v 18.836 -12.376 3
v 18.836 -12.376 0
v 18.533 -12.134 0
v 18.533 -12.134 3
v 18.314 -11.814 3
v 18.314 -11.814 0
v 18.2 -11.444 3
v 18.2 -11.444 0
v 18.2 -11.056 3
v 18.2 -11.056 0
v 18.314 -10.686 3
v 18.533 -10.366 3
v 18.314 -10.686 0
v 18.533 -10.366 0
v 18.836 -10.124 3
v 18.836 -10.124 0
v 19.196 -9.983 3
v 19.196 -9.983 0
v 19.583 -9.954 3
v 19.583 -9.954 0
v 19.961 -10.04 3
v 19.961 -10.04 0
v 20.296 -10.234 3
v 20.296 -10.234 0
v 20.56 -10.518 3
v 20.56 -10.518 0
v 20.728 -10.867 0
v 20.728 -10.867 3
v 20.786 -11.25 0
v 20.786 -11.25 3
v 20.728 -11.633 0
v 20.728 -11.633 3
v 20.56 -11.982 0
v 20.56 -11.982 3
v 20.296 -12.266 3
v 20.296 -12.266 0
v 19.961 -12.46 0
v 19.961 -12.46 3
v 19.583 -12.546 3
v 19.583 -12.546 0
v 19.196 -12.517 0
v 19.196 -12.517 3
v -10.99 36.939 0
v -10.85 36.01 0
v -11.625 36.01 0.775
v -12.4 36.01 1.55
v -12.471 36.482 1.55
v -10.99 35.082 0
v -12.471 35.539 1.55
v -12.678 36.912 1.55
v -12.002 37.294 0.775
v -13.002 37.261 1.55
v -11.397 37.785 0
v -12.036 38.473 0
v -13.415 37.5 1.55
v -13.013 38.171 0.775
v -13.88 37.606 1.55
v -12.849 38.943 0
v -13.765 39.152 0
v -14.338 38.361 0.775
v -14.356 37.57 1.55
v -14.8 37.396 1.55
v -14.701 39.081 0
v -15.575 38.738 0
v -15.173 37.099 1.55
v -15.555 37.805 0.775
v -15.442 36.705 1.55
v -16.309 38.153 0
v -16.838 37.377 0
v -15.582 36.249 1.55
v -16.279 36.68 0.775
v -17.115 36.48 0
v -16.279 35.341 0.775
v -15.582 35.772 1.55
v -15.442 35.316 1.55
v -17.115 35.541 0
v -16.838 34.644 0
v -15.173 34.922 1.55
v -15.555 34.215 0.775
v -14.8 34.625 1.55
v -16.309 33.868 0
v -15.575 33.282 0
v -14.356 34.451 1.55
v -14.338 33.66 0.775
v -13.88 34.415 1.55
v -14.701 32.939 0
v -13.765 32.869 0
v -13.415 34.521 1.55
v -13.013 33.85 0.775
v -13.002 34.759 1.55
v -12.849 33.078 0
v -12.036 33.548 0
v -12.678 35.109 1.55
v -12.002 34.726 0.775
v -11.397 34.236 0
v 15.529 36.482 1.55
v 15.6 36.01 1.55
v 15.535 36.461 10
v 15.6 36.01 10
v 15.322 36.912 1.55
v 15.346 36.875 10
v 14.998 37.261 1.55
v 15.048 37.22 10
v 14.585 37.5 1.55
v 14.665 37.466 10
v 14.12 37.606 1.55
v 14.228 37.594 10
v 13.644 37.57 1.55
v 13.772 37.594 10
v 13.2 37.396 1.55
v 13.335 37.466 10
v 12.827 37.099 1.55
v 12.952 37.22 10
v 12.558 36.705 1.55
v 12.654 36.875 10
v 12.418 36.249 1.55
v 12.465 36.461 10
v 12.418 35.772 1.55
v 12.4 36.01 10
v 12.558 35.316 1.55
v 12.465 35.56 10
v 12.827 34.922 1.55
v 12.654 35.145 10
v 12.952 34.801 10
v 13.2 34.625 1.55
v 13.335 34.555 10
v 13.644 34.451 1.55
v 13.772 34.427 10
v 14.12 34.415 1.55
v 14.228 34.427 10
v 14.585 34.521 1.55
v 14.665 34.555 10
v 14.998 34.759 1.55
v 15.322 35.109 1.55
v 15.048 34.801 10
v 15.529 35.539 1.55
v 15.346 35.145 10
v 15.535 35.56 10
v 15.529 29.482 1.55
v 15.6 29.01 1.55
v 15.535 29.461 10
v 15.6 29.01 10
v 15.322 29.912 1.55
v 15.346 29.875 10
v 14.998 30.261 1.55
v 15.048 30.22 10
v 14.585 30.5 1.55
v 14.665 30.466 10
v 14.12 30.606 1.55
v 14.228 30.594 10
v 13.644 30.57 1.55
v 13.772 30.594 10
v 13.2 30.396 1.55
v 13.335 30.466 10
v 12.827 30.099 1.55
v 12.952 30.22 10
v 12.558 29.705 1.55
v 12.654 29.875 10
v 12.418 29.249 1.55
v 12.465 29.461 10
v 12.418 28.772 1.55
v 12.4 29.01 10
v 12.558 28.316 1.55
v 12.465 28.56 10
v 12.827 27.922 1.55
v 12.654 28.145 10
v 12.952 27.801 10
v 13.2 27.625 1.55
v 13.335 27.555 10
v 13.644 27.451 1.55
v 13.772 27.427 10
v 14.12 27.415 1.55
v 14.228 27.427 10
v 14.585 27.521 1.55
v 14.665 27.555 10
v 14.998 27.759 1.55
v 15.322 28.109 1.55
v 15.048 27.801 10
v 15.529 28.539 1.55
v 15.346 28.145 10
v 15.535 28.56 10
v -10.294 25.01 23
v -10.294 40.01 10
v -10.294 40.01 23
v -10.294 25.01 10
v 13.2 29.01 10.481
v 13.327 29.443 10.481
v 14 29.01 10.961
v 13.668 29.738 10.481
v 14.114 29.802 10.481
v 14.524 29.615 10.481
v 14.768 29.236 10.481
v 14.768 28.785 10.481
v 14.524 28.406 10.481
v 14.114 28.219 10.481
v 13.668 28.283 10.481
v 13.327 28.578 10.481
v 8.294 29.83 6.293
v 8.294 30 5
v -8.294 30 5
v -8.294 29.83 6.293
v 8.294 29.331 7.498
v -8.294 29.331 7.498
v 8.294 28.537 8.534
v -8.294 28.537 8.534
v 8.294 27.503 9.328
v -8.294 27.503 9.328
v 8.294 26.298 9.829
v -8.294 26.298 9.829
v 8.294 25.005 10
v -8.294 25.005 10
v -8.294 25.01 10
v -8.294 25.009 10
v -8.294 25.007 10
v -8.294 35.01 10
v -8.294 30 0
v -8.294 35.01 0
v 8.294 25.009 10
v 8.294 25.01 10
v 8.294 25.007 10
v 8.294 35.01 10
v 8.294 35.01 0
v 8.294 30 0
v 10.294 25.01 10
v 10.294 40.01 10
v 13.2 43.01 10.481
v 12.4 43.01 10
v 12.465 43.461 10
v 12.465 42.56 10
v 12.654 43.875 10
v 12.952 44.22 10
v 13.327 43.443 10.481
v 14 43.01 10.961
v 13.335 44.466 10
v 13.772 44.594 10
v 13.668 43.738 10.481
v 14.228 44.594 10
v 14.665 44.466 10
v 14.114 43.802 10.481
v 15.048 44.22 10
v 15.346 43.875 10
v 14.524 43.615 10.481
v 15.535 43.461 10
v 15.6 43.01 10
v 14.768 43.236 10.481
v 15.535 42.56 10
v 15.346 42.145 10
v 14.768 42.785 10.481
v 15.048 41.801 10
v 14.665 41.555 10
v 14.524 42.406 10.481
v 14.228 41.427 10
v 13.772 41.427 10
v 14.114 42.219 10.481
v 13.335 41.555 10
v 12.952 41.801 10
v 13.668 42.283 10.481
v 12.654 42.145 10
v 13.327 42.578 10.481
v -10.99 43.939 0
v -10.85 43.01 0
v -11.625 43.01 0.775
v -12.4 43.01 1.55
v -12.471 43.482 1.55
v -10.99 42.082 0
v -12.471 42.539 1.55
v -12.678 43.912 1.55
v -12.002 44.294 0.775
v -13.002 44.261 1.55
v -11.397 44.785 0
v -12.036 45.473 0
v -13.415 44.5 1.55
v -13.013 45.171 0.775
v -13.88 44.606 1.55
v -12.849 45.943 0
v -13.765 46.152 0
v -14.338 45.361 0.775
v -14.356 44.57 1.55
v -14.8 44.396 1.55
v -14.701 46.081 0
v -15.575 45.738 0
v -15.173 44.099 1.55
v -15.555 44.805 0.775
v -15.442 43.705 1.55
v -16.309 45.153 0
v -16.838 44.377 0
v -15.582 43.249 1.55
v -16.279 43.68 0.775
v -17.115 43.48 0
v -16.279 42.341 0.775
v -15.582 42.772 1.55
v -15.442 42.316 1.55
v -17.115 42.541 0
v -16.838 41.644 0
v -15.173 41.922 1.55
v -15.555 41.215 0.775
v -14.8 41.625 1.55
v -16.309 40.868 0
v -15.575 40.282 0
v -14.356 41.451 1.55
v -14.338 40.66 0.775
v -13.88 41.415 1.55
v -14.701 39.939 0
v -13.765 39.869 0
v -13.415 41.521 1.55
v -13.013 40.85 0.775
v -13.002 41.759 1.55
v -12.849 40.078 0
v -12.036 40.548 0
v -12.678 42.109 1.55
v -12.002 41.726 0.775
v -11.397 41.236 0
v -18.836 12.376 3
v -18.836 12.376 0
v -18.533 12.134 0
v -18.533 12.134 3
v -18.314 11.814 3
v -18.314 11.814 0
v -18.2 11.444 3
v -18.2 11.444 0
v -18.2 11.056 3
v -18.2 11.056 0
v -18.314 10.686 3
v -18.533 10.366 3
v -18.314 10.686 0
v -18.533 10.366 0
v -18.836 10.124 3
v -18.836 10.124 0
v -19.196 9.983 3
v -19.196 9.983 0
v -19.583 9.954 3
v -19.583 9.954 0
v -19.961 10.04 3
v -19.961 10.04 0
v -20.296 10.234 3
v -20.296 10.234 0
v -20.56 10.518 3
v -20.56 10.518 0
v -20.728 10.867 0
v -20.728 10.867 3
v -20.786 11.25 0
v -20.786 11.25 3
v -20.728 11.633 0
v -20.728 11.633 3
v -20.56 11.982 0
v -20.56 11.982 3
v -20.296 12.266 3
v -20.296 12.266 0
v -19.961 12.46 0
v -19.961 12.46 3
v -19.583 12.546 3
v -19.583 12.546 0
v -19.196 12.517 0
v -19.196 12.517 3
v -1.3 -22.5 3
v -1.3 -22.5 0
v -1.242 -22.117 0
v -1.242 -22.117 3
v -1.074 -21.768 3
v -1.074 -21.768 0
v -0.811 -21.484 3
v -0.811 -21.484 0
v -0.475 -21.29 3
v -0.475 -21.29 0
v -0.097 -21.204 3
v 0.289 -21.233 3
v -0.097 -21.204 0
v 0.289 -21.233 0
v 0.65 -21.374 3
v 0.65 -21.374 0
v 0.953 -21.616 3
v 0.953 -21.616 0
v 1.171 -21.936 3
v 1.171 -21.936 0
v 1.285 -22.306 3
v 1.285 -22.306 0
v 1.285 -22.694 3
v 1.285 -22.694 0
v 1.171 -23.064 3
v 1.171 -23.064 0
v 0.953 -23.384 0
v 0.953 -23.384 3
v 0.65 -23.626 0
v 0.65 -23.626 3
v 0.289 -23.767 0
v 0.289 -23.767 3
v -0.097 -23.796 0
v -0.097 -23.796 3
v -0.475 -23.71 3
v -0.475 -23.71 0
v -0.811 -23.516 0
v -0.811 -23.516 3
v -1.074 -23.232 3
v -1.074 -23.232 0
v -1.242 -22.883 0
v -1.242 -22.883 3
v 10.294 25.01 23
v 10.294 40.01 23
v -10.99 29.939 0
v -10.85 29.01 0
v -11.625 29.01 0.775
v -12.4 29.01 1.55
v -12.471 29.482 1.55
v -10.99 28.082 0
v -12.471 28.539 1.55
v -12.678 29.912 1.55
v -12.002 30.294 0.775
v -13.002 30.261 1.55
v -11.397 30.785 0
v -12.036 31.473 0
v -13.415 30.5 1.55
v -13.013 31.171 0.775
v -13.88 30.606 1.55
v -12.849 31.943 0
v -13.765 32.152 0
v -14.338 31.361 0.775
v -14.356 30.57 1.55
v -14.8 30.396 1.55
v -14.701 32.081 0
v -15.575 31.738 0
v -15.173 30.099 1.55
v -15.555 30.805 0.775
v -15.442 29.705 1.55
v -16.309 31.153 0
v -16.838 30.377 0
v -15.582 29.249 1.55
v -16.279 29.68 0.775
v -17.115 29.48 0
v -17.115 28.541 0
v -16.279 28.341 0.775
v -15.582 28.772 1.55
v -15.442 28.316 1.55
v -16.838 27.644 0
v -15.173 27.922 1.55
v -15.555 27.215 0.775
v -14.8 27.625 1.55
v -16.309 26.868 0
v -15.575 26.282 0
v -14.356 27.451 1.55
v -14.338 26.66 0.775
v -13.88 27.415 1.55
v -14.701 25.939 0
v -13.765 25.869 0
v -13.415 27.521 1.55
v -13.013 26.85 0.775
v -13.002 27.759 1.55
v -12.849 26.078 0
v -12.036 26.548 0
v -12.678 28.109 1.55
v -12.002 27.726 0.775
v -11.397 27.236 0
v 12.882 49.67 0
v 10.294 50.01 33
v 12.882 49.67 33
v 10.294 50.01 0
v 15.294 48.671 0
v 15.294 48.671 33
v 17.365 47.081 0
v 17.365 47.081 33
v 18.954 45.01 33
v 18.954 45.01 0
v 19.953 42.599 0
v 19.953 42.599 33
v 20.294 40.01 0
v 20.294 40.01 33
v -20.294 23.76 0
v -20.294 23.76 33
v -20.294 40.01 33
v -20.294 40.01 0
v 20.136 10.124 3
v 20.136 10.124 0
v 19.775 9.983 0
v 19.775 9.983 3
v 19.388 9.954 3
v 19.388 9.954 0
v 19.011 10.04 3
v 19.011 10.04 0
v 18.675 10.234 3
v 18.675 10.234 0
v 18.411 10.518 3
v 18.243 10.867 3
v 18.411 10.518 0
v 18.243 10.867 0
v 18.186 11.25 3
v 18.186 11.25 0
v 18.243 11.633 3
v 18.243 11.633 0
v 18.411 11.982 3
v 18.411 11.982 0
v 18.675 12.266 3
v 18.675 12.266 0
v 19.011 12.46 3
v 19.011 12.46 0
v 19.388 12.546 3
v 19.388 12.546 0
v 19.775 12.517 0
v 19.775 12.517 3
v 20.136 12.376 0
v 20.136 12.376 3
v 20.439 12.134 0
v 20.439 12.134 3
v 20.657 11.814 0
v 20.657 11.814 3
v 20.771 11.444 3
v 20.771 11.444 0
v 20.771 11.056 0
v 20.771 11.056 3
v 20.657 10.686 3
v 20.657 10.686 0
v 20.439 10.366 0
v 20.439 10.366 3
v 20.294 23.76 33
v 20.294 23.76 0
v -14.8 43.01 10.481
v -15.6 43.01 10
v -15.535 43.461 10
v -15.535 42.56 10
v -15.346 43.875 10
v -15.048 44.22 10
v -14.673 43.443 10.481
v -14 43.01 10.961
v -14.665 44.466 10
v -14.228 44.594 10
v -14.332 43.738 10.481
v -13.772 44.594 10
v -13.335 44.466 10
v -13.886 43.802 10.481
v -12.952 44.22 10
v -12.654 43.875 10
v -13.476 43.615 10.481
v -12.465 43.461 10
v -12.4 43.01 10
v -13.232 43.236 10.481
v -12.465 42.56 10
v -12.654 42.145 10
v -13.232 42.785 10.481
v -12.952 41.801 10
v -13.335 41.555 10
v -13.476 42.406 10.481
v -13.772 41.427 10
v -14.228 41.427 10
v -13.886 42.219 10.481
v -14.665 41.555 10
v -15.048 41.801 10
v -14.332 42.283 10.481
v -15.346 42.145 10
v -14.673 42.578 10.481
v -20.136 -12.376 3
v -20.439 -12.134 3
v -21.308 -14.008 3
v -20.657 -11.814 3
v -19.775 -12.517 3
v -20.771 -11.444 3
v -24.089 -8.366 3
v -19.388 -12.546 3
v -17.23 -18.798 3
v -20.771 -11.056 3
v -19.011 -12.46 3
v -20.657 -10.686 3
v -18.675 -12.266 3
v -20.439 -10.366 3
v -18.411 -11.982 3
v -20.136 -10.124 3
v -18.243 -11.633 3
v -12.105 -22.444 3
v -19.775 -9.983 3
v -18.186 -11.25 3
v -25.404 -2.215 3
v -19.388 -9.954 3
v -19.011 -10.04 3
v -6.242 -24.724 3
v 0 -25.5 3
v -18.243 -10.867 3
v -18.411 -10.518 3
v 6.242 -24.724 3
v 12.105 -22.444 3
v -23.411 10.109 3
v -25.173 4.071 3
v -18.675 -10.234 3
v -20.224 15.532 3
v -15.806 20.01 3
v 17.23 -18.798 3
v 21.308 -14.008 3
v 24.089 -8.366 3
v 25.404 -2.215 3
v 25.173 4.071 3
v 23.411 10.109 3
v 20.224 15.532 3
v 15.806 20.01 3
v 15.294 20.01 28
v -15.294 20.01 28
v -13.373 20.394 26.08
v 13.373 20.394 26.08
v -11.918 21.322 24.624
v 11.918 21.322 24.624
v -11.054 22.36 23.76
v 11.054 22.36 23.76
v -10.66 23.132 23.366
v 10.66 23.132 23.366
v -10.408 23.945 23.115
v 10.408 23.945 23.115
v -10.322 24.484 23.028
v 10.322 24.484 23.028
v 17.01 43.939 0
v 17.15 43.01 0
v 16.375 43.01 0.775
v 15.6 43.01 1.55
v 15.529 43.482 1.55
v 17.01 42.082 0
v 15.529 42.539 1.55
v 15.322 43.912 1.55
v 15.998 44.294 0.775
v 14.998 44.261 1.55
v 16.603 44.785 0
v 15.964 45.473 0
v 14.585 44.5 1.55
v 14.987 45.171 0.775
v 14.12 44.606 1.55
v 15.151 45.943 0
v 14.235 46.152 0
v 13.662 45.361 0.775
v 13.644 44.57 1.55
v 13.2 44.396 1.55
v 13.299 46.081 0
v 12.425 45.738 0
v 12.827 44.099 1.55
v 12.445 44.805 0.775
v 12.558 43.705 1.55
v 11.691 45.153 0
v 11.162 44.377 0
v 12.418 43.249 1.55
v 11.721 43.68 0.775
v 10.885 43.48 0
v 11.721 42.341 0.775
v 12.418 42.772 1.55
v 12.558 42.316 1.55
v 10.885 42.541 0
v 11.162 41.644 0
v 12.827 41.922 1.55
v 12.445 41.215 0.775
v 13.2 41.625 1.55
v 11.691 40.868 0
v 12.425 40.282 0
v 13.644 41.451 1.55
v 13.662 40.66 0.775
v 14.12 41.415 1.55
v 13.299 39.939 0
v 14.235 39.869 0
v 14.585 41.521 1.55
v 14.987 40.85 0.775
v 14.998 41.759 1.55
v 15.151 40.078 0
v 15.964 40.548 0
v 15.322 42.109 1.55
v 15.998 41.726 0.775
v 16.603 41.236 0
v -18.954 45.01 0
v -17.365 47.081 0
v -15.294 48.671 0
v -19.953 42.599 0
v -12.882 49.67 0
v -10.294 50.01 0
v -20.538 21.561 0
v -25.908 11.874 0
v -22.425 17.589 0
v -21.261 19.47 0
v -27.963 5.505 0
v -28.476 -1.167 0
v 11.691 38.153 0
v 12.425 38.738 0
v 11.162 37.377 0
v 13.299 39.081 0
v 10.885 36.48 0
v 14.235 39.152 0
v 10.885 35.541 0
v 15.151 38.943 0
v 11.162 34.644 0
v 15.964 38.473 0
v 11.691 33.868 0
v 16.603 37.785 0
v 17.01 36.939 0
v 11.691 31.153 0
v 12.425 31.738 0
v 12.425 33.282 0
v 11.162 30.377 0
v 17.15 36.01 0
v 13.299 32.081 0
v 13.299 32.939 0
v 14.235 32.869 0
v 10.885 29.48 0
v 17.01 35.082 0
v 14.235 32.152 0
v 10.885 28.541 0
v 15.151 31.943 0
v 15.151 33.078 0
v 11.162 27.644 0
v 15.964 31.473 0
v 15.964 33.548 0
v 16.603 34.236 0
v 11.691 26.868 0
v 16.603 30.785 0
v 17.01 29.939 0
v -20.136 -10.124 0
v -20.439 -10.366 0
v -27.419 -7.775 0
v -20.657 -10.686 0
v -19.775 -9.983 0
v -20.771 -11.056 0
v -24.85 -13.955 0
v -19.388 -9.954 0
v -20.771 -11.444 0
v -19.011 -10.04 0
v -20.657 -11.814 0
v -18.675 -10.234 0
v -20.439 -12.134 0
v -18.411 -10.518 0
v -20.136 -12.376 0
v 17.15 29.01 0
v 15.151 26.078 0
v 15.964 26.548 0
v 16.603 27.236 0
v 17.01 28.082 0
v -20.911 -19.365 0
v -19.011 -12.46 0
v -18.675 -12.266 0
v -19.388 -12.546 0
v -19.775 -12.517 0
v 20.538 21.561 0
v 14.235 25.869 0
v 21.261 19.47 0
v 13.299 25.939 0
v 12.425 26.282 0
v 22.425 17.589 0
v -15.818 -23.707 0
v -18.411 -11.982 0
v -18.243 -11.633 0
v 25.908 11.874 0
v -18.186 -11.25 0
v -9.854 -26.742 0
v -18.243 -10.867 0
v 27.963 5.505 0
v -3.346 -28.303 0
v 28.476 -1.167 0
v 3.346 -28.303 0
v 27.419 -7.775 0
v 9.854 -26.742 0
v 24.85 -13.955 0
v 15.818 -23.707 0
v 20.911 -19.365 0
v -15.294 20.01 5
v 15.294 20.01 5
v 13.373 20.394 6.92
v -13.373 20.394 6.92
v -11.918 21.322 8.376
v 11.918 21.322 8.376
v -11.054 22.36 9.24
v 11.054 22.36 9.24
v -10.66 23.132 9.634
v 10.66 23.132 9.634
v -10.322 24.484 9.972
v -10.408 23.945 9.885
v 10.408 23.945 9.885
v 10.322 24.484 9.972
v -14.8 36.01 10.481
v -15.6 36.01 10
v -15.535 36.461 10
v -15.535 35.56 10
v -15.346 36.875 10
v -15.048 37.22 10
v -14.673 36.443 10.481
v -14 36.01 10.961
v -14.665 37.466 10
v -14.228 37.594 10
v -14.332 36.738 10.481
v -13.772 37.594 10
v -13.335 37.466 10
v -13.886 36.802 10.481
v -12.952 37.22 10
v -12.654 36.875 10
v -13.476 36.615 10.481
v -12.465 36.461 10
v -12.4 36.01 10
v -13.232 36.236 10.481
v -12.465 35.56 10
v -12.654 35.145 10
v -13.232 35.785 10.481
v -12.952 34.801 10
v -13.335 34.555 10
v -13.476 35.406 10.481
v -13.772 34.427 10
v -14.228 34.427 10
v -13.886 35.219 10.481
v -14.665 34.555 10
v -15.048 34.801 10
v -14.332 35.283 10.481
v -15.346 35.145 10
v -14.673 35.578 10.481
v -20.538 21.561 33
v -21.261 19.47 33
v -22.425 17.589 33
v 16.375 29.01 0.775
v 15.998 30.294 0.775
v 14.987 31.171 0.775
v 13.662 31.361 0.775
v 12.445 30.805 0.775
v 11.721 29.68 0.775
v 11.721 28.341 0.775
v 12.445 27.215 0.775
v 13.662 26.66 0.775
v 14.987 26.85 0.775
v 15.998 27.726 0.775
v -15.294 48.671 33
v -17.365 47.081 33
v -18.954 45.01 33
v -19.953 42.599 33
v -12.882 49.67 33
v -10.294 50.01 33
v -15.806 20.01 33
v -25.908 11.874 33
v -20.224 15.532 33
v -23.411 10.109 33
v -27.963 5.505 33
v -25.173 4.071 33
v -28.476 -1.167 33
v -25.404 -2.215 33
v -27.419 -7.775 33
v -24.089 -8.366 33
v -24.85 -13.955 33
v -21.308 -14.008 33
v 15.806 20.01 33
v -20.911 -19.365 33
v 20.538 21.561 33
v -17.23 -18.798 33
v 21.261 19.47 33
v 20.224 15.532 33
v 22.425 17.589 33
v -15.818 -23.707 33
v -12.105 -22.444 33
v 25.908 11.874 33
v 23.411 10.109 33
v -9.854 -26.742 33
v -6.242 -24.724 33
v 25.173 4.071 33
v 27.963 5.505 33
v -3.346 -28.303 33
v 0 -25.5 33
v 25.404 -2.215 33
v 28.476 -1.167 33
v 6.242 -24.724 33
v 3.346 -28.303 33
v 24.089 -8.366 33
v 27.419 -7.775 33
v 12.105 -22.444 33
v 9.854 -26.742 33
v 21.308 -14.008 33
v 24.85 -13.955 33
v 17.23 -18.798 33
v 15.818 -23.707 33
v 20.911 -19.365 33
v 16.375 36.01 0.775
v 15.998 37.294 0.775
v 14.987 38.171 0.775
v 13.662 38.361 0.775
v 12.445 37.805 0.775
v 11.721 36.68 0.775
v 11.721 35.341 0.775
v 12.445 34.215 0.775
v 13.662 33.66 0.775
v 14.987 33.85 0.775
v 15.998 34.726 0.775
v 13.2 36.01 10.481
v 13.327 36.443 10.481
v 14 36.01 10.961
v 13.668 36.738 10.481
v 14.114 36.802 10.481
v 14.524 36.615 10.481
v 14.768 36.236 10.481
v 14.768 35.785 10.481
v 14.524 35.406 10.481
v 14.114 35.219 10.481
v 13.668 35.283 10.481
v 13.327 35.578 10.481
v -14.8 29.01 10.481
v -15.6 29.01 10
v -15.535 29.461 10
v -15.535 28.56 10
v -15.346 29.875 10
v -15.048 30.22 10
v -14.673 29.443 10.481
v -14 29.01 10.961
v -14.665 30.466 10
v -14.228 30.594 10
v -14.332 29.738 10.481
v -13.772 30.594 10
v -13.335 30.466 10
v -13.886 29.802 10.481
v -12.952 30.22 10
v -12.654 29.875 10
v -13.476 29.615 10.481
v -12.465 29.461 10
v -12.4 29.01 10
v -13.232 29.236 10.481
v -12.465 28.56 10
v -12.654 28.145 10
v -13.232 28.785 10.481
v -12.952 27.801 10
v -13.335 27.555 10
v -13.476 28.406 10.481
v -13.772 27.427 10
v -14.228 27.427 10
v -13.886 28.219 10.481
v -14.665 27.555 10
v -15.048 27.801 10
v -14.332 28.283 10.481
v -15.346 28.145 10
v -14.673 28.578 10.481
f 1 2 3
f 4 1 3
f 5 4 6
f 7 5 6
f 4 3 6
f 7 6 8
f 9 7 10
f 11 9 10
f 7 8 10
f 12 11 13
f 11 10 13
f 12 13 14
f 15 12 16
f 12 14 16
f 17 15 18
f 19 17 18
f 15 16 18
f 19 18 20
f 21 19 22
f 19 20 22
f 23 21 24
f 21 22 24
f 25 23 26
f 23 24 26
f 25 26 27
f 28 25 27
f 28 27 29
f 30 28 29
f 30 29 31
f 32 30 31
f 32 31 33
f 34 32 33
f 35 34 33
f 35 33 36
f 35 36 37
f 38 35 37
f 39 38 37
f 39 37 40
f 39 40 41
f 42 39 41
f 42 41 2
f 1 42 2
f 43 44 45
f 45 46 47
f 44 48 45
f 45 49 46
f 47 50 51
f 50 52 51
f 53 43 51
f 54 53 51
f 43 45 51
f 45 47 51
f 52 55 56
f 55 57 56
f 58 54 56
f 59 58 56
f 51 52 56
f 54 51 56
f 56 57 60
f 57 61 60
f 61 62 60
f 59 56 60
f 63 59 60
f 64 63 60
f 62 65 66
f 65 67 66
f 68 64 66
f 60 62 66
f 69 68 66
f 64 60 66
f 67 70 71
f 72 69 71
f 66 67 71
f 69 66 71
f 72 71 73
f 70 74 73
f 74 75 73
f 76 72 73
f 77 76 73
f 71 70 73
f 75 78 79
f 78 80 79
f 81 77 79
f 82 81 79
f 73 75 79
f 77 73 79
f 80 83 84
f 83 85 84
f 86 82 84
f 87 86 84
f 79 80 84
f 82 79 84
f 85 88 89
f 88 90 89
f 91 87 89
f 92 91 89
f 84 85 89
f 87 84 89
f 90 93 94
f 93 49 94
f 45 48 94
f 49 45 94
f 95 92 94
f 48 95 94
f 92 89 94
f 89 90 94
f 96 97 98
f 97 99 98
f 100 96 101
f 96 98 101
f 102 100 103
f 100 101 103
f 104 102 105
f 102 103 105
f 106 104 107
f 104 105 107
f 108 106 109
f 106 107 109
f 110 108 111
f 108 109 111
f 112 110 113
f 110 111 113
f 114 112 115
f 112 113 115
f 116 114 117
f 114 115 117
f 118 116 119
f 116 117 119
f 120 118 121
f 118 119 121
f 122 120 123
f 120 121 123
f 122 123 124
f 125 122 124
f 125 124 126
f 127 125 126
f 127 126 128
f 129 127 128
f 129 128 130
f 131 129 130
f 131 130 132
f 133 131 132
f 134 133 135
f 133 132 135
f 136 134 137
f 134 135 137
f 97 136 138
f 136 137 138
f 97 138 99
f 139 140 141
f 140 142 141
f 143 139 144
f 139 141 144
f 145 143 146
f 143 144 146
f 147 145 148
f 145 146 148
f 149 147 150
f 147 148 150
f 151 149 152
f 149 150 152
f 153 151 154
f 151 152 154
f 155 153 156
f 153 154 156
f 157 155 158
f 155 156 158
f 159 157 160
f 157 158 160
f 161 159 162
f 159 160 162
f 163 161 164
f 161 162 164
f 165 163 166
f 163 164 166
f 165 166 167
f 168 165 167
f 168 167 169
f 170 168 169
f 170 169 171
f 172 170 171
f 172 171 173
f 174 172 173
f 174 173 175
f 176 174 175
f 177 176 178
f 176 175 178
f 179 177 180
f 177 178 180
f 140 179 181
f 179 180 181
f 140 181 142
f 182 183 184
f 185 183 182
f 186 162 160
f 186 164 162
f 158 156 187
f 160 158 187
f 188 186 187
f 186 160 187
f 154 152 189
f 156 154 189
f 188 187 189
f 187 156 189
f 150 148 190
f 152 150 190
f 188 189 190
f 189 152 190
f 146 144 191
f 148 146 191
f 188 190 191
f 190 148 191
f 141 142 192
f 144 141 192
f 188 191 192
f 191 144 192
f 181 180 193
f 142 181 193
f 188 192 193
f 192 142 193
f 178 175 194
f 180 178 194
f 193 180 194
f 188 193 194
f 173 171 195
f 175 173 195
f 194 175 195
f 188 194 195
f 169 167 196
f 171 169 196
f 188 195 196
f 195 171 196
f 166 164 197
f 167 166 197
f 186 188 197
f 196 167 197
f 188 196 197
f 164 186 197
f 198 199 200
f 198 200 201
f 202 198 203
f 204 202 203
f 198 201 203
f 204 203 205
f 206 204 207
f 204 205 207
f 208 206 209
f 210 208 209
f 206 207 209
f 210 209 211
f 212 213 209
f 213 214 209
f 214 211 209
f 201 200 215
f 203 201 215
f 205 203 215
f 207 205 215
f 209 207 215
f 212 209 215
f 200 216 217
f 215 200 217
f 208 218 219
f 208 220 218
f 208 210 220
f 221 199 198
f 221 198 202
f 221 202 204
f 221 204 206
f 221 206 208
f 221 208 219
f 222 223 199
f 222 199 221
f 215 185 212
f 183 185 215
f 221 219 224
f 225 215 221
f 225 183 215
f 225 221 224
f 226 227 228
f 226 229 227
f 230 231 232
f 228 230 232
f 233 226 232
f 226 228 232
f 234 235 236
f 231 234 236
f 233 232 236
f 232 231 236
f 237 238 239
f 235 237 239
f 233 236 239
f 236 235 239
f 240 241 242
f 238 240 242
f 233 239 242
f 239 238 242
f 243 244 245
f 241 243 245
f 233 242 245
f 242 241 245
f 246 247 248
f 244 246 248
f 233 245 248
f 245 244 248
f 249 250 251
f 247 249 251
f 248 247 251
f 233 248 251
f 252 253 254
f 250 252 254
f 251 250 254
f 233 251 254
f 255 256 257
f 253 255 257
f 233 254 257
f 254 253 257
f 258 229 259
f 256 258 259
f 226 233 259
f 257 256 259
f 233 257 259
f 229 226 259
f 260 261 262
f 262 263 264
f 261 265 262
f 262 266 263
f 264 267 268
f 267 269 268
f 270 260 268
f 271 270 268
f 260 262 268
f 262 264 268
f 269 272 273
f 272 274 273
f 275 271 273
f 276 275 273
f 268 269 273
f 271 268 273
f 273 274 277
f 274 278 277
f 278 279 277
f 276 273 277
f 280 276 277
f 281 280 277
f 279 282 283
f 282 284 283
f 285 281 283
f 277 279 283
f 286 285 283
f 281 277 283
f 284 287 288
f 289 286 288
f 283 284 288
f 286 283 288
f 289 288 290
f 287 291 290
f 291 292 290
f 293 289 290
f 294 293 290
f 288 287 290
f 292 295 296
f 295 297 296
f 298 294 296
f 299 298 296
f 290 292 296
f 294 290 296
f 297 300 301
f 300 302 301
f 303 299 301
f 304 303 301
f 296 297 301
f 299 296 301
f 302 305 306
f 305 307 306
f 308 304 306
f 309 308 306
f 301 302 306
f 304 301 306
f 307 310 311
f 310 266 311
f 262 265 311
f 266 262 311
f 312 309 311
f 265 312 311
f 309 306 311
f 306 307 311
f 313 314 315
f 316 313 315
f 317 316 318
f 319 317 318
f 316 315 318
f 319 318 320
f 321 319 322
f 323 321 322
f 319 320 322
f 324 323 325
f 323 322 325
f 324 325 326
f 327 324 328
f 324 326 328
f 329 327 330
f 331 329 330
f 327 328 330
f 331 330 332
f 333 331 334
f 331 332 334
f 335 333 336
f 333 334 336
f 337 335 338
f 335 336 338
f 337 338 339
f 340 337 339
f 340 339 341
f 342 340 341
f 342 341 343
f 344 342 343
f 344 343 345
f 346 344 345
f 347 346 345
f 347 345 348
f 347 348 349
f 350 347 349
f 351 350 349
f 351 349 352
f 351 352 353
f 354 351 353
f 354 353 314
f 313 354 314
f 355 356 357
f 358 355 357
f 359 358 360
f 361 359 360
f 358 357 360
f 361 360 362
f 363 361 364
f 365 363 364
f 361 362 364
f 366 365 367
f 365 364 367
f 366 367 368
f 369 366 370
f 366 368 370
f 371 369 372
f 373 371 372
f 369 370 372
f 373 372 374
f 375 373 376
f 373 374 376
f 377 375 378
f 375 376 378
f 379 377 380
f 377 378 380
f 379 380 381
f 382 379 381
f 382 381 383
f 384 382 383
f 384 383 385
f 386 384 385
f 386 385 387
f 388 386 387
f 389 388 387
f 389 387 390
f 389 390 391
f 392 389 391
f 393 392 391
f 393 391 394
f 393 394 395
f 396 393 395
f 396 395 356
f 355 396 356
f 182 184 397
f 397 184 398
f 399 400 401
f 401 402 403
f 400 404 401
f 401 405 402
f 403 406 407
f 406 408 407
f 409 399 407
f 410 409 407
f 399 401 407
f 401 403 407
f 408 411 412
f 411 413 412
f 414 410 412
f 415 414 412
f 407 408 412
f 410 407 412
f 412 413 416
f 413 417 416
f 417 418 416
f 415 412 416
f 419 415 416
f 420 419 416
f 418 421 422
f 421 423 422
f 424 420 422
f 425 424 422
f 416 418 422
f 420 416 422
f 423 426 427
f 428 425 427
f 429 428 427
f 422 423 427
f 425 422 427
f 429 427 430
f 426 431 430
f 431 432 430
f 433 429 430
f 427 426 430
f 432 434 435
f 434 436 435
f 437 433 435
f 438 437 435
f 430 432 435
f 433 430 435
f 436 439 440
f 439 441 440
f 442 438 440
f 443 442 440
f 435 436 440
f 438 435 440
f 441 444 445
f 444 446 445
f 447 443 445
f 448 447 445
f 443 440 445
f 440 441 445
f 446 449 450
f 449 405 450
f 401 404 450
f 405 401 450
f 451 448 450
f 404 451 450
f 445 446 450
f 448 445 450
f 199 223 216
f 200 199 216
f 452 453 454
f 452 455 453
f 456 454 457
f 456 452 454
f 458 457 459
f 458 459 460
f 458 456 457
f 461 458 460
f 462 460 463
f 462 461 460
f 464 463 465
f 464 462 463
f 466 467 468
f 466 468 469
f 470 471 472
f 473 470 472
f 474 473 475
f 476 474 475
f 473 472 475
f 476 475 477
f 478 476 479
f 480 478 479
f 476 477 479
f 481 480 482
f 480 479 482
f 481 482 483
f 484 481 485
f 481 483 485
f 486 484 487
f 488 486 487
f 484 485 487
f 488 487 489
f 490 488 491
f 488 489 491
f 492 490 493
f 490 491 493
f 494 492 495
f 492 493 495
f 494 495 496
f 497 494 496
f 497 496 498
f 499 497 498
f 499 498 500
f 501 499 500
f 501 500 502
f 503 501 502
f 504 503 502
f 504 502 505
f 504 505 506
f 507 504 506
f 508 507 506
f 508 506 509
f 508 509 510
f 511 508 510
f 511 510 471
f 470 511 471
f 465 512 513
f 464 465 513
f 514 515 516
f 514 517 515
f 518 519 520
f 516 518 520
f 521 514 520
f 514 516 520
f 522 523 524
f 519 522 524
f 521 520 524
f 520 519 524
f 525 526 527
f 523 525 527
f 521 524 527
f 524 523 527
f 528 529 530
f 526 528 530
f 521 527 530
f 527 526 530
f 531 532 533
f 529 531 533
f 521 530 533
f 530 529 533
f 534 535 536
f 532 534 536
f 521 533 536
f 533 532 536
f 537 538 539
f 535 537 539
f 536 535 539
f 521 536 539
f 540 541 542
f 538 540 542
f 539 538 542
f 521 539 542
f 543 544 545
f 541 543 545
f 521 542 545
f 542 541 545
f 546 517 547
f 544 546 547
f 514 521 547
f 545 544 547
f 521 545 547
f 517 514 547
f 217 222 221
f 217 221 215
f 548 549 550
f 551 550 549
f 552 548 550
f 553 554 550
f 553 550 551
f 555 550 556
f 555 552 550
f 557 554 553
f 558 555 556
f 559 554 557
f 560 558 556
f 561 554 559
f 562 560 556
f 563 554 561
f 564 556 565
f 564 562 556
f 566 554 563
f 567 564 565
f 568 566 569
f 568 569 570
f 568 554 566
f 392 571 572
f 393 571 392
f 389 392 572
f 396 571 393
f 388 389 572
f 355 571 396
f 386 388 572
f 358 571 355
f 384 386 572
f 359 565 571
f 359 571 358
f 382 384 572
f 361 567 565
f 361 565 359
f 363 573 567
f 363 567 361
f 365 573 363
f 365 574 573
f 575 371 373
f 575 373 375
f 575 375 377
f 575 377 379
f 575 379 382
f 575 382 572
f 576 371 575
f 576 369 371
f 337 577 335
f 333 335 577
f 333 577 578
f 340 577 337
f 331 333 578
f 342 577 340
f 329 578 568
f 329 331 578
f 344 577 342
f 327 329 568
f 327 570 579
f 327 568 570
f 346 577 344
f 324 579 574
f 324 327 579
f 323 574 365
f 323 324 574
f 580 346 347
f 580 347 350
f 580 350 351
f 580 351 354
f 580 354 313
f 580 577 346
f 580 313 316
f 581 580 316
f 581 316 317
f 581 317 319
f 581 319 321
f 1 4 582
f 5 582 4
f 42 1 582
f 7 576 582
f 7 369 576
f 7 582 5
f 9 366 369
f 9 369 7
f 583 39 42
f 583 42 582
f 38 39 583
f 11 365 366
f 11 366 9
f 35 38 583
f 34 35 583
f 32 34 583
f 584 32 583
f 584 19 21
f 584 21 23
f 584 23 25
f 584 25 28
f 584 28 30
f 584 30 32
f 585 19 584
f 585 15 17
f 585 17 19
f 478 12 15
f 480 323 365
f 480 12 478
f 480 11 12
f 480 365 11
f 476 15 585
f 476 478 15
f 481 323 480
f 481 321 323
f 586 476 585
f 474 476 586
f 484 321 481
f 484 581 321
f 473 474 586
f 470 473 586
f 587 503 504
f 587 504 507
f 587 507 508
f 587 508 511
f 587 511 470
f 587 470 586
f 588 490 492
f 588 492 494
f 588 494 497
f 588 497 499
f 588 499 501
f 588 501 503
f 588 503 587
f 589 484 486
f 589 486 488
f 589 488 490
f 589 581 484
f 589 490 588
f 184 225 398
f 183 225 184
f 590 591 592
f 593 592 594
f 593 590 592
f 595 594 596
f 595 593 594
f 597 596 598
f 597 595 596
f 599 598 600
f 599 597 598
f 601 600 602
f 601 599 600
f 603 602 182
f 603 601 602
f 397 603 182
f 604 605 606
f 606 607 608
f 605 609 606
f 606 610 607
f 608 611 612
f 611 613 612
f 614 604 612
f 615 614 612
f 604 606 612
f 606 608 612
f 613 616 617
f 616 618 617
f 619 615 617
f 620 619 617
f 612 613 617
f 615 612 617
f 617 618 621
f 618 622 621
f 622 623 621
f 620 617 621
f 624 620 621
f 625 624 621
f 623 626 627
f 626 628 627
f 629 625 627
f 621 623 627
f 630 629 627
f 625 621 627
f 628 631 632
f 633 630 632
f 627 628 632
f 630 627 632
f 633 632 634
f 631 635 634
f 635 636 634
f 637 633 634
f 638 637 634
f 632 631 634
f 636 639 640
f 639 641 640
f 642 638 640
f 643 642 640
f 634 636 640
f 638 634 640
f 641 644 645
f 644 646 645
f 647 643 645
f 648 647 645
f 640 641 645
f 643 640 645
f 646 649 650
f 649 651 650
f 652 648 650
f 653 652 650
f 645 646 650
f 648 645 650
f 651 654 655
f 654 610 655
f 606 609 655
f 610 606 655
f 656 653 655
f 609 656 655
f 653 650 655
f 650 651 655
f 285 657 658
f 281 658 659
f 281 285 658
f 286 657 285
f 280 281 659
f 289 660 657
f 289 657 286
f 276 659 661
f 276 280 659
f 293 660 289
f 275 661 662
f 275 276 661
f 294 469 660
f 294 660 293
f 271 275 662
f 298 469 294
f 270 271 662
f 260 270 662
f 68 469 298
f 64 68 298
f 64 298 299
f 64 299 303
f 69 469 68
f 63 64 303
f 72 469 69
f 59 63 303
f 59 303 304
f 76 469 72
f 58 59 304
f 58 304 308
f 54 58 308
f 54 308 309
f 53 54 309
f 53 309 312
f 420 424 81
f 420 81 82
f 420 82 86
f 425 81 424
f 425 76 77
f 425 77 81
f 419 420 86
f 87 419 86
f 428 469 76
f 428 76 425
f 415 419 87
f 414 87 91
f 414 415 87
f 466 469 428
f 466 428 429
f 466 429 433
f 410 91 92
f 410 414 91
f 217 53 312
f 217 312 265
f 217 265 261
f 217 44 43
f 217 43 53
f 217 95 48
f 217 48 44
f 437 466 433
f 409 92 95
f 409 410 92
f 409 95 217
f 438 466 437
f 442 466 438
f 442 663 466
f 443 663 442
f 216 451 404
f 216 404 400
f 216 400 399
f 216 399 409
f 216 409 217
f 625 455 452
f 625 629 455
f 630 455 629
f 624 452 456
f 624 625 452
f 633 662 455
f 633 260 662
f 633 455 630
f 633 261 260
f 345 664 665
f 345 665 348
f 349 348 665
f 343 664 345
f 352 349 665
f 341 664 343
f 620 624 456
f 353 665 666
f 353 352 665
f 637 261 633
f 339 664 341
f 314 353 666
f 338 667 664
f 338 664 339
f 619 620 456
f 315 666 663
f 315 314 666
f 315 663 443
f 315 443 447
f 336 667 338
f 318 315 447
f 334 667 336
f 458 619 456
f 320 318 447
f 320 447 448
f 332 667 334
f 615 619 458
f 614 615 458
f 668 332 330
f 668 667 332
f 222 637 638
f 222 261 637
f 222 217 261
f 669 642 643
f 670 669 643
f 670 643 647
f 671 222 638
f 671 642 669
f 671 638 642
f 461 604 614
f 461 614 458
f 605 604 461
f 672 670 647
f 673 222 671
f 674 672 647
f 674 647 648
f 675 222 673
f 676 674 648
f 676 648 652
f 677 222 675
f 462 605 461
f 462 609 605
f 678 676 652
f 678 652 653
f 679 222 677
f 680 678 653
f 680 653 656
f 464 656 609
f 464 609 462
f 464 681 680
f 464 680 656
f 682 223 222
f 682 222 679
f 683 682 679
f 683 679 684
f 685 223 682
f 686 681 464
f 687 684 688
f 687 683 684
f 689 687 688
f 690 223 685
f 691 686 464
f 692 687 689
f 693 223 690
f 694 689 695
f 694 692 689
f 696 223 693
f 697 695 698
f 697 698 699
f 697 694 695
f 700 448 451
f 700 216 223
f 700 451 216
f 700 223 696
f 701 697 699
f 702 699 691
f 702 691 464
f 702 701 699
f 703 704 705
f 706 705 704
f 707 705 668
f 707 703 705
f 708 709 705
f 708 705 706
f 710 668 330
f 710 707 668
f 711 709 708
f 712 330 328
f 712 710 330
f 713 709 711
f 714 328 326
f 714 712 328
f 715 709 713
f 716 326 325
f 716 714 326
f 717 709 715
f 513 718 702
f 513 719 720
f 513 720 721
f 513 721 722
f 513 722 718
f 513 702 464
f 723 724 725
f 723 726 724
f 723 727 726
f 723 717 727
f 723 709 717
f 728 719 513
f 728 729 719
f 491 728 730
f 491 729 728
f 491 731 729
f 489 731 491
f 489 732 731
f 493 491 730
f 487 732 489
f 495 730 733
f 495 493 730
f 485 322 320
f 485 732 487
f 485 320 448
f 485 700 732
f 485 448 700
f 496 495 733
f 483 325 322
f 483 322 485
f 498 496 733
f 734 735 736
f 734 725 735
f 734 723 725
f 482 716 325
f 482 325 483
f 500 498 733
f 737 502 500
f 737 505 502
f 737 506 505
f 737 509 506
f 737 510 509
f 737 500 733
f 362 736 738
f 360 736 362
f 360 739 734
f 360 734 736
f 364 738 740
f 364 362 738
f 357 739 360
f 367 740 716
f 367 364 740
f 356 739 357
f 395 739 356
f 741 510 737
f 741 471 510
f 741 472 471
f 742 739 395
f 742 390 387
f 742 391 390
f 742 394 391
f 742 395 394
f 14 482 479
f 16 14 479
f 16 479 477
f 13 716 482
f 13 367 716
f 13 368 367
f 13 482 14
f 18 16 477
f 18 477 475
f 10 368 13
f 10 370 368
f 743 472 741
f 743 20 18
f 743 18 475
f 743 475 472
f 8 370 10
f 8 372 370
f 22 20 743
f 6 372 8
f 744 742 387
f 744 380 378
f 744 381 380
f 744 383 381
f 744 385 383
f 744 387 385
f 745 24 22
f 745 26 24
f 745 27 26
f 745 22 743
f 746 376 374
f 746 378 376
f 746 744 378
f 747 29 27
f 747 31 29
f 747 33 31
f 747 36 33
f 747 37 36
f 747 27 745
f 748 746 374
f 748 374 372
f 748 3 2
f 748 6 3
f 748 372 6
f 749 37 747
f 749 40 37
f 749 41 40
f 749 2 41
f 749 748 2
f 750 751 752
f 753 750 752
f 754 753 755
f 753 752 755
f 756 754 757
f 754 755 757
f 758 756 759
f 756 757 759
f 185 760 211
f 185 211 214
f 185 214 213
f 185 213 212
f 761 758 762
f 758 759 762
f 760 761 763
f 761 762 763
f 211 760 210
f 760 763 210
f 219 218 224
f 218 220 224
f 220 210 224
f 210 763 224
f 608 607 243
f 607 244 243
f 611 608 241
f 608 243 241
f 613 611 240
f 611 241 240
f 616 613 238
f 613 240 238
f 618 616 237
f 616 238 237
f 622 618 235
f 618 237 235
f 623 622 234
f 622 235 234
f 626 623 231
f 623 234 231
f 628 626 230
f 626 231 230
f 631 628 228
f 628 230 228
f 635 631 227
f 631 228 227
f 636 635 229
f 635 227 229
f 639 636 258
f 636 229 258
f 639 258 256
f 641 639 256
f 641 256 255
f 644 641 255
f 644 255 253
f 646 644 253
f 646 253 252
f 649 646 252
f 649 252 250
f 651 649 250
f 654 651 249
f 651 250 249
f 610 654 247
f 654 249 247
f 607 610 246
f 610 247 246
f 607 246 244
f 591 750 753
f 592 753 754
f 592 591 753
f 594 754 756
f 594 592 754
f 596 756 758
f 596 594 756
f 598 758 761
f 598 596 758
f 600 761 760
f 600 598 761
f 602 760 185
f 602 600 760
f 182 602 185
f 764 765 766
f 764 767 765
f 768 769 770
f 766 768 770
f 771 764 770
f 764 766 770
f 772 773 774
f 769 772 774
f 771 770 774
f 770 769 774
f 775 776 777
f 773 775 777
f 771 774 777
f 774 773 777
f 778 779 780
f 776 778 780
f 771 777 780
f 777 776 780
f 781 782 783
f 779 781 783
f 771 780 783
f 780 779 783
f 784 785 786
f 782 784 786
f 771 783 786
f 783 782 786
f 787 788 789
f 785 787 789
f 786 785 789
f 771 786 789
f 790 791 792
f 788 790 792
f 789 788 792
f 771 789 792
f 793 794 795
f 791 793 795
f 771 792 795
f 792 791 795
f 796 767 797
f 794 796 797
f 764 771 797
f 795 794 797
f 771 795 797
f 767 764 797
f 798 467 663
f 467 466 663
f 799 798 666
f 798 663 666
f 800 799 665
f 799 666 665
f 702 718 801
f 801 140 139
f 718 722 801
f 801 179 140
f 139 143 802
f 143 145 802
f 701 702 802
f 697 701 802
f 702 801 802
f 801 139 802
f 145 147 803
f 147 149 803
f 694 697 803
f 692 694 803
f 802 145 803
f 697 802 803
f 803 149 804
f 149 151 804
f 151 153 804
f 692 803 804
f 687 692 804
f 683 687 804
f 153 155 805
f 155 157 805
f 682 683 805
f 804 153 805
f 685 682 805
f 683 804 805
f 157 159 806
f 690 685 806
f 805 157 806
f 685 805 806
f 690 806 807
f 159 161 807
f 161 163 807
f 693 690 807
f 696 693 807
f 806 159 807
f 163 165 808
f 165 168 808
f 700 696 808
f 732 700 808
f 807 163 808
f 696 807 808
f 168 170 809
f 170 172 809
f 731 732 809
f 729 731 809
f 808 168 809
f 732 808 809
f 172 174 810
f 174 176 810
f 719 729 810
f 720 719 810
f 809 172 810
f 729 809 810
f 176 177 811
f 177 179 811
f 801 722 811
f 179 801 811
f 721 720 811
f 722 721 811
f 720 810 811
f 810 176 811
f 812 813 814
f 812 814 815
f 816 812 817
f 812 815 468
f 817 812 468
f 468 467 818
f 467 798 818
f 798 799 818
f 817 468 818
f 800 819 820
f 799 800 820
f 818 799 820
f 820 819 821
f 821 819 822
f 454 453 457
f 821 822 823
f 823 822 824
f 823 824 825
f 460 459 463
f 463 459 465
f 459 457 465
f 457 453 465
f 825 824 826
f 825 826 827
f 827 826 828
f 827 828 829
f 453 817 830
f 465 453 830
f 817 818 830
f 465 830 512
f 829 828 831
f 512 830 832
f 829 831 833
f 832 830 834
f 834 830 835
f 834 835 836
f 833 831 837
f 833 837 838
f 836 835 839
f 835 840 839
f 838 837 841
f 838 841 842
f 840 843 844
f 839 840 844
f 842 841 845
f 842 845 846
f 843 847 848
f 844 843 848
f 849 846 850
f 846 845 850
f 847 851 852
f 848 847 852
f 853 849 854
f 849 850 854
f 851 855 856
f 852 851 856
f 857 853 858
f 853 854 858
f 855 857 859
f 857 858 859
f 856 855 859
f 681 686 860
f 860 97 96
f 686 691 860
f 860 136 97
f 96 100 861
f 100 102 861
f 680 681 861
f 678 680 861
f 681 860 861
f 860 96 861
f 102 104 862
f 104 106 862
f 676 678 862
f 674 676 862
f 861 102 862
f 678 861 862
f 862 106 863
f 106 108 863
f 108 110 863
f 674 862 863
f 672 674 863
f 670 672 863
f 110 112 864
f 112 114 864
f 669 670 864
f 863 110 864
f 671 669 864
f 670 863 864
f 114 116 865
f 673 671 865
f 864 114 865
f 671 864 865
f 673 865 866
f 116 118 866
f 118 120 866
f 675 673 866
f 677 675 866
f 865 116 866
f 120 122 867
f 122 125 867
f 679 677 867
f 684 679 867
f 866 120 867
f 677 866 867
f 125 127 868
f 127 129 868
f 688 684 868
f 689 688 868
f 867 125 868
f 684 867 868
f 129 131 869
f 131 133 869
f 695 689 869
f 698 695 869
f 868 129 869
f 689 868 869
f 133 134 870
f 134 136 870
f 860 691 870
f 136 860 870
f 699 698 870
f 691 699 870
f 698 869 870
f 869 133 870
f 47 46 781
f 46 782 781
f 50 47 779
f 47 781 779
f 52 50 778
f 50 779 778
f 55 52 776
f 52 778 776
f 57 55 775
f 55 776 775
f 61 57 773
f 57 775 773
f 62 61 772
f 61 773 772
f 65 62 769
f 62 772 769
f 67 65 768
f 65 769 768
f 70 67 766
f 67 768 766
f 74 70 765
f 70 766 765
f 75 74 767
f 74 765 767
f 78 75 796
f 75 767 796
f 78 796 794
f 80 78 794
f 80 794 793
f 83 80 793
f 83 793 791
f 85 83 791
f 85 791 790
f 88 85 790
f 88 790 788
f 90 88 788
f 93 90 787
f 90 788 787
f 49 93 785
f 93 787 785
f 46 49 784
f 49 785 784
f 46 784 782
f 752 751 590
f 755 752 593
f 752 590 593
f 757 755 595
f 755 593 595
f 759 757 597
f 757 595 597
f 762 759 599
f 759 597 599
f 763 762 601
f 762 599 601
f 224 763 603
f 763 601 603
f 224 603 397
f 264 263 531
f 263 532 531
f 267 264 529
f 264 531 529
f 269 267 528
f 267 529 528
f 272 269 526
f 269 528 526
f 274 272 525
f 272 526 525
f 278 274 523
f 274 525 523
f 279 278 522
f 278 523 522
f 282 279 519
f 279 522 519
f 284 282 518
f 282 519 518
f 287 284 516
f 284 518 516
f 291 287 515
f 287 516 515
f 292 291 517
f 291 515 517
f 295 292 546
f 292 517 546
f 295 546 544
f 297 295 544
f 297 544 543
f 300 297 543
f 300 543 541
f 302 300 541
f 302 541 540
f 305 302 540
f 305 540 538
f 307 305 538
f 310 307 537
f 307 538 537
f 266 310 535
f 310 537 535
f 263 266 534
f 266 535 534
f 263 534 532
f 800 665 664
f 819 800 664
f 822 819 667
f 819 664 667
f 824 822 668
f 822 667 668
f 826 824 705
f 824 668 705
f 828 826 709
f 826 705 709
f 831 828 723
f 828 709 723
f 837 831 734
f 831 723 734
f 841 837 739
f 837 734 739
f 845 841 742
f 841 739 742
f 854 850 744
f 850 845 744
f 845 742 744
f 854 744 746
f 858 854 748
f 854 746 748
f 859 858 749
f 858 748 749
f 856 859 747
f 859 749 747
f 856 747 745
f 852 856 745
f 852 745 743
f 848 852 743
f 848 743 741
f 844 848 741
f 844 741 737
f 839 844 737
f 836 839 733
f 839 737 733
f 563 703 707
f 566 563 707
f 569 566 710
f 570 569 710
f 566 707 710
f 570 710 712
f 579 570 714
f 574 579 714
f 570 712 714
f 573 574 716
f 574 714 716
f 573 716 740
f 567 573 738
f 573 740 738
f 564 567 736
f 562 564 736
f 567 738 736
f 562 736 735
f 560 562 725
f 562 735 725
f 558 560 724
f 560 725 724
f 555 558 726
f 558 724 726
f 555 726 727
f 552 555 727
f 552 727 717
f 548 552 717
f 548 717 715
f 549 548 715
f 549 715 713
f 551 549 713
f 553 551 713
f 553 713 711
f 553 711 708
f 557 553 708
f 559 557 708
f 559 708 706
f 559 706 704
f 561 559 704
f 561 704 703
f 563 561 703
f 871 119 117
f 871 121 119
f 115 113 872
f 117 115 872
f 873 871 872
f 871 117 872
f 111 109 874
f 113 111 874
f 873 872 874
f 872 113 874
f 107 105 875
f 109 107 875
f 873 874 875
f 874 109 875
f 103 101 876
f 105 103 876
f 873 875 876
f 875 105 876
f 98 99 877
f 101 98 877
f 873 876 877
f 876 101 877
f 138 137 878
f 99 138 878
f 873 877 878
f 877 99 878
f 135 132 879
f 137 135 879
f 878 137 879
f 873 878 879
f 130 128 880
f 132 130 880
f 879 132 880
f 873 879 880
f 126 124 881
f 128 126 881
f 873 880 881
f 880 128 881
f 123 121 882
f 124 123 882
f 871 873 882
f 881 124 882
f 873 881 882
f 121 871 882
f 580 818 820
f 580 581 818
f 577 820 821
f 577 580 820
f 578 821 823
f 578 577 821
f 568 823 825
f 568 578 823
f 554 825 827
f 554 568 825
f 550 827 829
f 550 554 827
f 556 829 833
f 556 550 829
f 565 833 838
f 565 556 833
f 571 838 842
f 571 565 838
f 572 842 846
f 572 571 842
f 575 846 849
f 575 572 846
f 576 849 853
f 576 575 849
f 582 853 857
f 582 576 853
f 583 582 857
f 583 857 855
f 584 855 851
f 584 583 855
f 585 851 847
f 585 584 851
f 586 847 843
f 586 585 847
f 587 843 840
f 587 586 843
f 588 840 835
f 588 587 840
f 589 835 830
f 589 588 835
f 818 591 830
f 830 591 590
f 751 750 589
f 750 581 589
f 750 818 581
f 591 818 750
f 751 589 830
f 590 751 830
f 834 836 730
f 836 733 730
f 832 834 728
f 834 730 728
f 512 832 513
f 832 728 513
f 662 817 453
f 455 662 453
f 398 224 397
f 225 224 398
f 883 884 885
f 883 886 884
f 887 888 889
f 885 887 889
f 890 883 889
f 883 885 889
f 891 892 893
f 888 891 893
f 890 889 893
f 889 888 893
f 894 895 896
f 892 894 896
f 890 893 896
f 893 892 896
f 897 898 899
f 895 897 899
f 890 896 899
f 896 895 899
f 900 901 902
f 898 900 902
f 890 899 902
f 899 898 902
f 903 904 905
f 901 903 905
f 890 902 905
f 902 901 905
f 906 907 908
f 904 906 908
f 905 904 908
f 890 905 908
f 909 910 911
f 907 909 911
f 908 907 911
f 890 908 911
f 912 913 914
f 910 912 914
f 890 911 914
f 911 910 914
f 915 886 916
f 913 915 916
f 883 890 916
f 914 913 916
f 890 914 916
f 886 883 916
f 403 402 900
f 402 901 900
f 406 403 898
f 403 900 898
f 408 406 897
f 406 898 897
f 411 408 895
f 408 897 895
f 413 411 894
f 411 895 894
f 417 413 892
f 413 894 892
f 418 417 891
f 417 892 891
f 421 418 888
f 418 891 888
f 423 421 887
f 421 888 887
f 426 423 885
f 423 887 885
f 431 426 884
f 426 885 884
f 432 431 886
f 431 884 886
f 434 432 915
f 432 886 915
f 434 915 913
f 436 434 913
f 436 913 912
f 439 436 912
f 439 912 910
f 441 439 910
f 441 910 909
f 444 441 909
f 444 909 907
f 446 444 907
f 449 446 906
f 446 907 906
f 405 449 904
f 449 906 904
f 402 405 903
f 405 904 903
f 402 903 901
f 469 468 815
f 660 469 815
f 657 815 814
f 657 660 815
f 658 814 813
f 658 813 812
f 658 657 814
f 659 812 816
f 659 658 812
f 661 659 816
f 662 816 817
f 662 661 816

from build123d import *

# Parameters (mm, degrees)
SKETCH1_R                                       = 28.5
BOSS_EXTRUDE1_DEPTH                             = 33
SHELL1_T                                        = -3
SKETCH2_W                                       = 68.33882079
SKETCH2_H                                       = 10.979214438
CUT_EXTRUDE1_DEPTH                              = 53.091266063
SKETCH3_W                                       = 40.58739611
SKETCH3_H                                       = 33
BOSS_EXTRUDE2_DEPTH                             = 30
CUT_EXTRUDE4_REACH                              = 68.35
SKETCH6_R                                       = 1.3
CIRPATTERN1_COUNT                               = 6
FILLET1_R                                       = 10
SHELL2_START                                    = 10
SHELL2_DEPTH                                    = 13
SKETCH9_W                                       = 16.58739611
SKETCH9_H                                       = 5.010392781
CUT_EXTRUDE6_DEPTH                              = 12
CSK_FOR_M3_FLAT_HEAD_MACHINE_SCREW1_D           = 3.2
CSK_FOR_M3_FLAT_HEAD_MACHINE_SCREW1_DEPTH       = 10
CSK_FOR_M3_FLAT_HEAD_MACHINE_SCREW1_CSINK_D     = 6.3
CSK_FOR_M3_FLAT_HEAD_MACHINE_SCREW1_CSINK_ANGLE = 90
CSK_FOR_M3_FLAT_HEAD_MACHINE_SCREW1_TIP         = 0.96137699
FILLET2_R                                       = 5
FILLET3_R                                       = 5


# Read off the part's stored shape, not the designer's step: Shell2
with BuildPart() as part:
    # Sketch1 → Boss-Extrude1 (new body)
    with BuildSketch(Plane.XY):
        Circle(SKETCH1_R)
    extrude(amount=BOSS_EXTRUDE1_DEPTH)

    # Shell1
    shell1_openings = [part.faces().sort_by_distance(p)[0] for p in [
        (0, 0, 33),
    ]]
    offset(amount=SHELL1_T, openings=shell1_openings, kind=Kind.INTERSECTION)

    # Sketch2 → Cut-Extrude1 (cut, through all)
    with BuildSketch(Plane.XY.offset(33)):
        with Locations((0, 25.5)):
            Rectangle(SKETCH2_W, SKETCH2_H)
    extrude(amount=-CUT_EXTRUDE1_DEPTH, mode=Mode.SUBTRACT)

    # Sketch3 → Boss-Extrude2 (add)
    with BuildSketch(Plane(origin=(0, 20.010392781, 0), x_dir=(1, 0, 0), z_dir=(0, 1, 0))):
        with Locations((0, -16.5)):
            Rectangle(SKETCH3_W, SKETCH3_H)
    extrude(amount=BOSS_EXTRUDE2_DEPTH)

    # Sketch6 → Cut-Extrude4 (cut, up to next)
    with BuildSketch(Plane(origin=(0, 0, 0), x_dir=(-1, 0, 0), z_dir=(0, 0, -1)), mode=Mode.PRIVATE) as cut_extrude4_sk1:
        with Locations((0, -22.5)):
            Circle(SKETCH6_R)
    cut_extrude4_tool1 = extrude(cut_extrude4_sk1.sketch, amount=-CUT_EXTRUDE4_REACH, mode=Mode.PRIVATE) & part.part
    cut_extrude4 = cut_extrude4_tool1.solids().sort_by_distance((0, -22.5, 0))[0]
    add(cut_extrude4, mode=Mode.SUBTRACT)

    # CirPattern1: Cut-Extrude4 ×6 about axis, 1 skipped
    cirpattern1_axis = Axis((0, 0, 0), (0, 0, 1))
    add([cut_extrude4.rotate(cirpattern1_axis, i * 360 / CIRPATTERN1_COUNT) for i in range(1, CIRPATTERN1_COUNT) if i not in (3,)], mode=Mode.SUBTRACT)

    # Fillet1
    fillet1_edges = [part.edges().sort_by_distance(p)[0] for p in [
        (-20.293698055, 20.010392781, 16.5),
        (20.293698055, 20.010392781, 16.5),
        (-20.293698055, 50.010392781, 16.5),
        (20.293698055, 50.010392781, 16.5),
    ]]
    fillet(fillet1_edges, radius=FILLET1_R)

    # Shell2 outline → Shell2 (cut)
    with BuildSketch(Plane.XY.offset(SHELL2_START)):
        with BuildLine():
            Line((-10.293698055, 40.010392781), (-10.293698055, 23.760089607))
            ThreePointArc((-10.293698055, 23.760089607), (-10.382557976, 21.876874075), (-10.648348129, 20.010392781))
            Line((-10.648348129, 20.010392781), (10.648348129, 20.010392781))
            ThreePointArc((10.648348129, 20.010392781), (10.382557976, 21.876874075), (10.293698055, 23.760089607))
            Line((10.293698055, 23.760089607), (10.293698055, 40.010392781))
            Line((10.293698055, 40.010392781), (-10.293698055, 40.010392781))
        make_face()
    extrude(amount=SHELL2_DEPTH, mode=Mode.SUBTRACT)

    # Sketch9 → Cut-Extrude6 (cut)
    with BuildSketch(Plane(origin=(0, 0, 0), x_dir=(-1, 0, 0), z_dir=(0, 0, -1))):
        with Locations((0, 32.505196391)):
            Rectangle(SKETCH9_W, SKETCH9_H)
    extrude(amount=-CUT_EXTRUDE6_DEPTH, mode=Mode.SUBTRACT)

    # CSK for M3 Flat Head Machine Screw1
    with Locations(Plane(origin=(0, 0, 0), x_dir=(-1, 0, 0), z_dir=(0, 0, -1))):
        with Locations((-14, 43.010392781), (-14, 29.010392781), (14, 43.010392781), (14, 36.010392781), (14, 29.010392781), (-14, 36.010392781)):
            CounterSinkHole(CSK_FOR_M3_FLAT_HEAD_MACHINE_SCREW1_D / 2, CSK_FOR_M3_FLAT_HEAD_MACHINE_SCREW1_CSINK_D / 2, depth=CSK_FOR_M3_FLAT_HEAD_MACHINE_SCREW1_DEPTH, counter_sink_angle=CSK_FOR_M3_FLAT_HEAD_MACHINE_SCREW1_CSINK_ANGLE)
            with Locations((0, 0, -(CSK_FOR_M3_FLAT_HEAD_MACHINE_SCREW1_DEPTH + CSK_FOR_M3_FLAT_HEAD_MACHINE_SCREW1_TIP / 2))):  # 118° drill point
                Cone(0, CSK_FOR_M3_FLAT_HEAD_MACHINE_SCREW1_D / 2, CSK_FOR_M3_FLAT_HEAD_MACHINE_SCREW1_TIP, mode=Mode.SUBTRACT)

    # Fillet2
    fillet2_edges = [part.edges().sort_by_distance(p)[0] for p in [
        (0, 20.010392781, 23),
        (0, 20.010392781, 10),
        (10.648348129, 20.010392781, 16.5),
        (-10.648348129, 20.010392781, 16.5),
    ]]
    fillet(fillet2_edges, radius=FILLET2_R)

    # Fillet3
    # the kernel refuses this fillet: 5 mm, written as the material it takes off along each edge
    with BuildSketch(Plane(origin=(-8.293698055, 30, 10), x_dir=(0, -1, 0), z_dir=(1, 0, 0))) as fillet3_piece_1:
        with BuildLine():
            CenterArc((FILLET3_R, FILLET3_R), FILLET3_R, 180, 90)
            Line((0, FILLET3_R), (0, 0))
            Line((0, 0), (FILLET3_R, 0))
        make_face()
    extrude(amount=16.58739611, mode=Mode.SUBTRACT)


solid = part.part
